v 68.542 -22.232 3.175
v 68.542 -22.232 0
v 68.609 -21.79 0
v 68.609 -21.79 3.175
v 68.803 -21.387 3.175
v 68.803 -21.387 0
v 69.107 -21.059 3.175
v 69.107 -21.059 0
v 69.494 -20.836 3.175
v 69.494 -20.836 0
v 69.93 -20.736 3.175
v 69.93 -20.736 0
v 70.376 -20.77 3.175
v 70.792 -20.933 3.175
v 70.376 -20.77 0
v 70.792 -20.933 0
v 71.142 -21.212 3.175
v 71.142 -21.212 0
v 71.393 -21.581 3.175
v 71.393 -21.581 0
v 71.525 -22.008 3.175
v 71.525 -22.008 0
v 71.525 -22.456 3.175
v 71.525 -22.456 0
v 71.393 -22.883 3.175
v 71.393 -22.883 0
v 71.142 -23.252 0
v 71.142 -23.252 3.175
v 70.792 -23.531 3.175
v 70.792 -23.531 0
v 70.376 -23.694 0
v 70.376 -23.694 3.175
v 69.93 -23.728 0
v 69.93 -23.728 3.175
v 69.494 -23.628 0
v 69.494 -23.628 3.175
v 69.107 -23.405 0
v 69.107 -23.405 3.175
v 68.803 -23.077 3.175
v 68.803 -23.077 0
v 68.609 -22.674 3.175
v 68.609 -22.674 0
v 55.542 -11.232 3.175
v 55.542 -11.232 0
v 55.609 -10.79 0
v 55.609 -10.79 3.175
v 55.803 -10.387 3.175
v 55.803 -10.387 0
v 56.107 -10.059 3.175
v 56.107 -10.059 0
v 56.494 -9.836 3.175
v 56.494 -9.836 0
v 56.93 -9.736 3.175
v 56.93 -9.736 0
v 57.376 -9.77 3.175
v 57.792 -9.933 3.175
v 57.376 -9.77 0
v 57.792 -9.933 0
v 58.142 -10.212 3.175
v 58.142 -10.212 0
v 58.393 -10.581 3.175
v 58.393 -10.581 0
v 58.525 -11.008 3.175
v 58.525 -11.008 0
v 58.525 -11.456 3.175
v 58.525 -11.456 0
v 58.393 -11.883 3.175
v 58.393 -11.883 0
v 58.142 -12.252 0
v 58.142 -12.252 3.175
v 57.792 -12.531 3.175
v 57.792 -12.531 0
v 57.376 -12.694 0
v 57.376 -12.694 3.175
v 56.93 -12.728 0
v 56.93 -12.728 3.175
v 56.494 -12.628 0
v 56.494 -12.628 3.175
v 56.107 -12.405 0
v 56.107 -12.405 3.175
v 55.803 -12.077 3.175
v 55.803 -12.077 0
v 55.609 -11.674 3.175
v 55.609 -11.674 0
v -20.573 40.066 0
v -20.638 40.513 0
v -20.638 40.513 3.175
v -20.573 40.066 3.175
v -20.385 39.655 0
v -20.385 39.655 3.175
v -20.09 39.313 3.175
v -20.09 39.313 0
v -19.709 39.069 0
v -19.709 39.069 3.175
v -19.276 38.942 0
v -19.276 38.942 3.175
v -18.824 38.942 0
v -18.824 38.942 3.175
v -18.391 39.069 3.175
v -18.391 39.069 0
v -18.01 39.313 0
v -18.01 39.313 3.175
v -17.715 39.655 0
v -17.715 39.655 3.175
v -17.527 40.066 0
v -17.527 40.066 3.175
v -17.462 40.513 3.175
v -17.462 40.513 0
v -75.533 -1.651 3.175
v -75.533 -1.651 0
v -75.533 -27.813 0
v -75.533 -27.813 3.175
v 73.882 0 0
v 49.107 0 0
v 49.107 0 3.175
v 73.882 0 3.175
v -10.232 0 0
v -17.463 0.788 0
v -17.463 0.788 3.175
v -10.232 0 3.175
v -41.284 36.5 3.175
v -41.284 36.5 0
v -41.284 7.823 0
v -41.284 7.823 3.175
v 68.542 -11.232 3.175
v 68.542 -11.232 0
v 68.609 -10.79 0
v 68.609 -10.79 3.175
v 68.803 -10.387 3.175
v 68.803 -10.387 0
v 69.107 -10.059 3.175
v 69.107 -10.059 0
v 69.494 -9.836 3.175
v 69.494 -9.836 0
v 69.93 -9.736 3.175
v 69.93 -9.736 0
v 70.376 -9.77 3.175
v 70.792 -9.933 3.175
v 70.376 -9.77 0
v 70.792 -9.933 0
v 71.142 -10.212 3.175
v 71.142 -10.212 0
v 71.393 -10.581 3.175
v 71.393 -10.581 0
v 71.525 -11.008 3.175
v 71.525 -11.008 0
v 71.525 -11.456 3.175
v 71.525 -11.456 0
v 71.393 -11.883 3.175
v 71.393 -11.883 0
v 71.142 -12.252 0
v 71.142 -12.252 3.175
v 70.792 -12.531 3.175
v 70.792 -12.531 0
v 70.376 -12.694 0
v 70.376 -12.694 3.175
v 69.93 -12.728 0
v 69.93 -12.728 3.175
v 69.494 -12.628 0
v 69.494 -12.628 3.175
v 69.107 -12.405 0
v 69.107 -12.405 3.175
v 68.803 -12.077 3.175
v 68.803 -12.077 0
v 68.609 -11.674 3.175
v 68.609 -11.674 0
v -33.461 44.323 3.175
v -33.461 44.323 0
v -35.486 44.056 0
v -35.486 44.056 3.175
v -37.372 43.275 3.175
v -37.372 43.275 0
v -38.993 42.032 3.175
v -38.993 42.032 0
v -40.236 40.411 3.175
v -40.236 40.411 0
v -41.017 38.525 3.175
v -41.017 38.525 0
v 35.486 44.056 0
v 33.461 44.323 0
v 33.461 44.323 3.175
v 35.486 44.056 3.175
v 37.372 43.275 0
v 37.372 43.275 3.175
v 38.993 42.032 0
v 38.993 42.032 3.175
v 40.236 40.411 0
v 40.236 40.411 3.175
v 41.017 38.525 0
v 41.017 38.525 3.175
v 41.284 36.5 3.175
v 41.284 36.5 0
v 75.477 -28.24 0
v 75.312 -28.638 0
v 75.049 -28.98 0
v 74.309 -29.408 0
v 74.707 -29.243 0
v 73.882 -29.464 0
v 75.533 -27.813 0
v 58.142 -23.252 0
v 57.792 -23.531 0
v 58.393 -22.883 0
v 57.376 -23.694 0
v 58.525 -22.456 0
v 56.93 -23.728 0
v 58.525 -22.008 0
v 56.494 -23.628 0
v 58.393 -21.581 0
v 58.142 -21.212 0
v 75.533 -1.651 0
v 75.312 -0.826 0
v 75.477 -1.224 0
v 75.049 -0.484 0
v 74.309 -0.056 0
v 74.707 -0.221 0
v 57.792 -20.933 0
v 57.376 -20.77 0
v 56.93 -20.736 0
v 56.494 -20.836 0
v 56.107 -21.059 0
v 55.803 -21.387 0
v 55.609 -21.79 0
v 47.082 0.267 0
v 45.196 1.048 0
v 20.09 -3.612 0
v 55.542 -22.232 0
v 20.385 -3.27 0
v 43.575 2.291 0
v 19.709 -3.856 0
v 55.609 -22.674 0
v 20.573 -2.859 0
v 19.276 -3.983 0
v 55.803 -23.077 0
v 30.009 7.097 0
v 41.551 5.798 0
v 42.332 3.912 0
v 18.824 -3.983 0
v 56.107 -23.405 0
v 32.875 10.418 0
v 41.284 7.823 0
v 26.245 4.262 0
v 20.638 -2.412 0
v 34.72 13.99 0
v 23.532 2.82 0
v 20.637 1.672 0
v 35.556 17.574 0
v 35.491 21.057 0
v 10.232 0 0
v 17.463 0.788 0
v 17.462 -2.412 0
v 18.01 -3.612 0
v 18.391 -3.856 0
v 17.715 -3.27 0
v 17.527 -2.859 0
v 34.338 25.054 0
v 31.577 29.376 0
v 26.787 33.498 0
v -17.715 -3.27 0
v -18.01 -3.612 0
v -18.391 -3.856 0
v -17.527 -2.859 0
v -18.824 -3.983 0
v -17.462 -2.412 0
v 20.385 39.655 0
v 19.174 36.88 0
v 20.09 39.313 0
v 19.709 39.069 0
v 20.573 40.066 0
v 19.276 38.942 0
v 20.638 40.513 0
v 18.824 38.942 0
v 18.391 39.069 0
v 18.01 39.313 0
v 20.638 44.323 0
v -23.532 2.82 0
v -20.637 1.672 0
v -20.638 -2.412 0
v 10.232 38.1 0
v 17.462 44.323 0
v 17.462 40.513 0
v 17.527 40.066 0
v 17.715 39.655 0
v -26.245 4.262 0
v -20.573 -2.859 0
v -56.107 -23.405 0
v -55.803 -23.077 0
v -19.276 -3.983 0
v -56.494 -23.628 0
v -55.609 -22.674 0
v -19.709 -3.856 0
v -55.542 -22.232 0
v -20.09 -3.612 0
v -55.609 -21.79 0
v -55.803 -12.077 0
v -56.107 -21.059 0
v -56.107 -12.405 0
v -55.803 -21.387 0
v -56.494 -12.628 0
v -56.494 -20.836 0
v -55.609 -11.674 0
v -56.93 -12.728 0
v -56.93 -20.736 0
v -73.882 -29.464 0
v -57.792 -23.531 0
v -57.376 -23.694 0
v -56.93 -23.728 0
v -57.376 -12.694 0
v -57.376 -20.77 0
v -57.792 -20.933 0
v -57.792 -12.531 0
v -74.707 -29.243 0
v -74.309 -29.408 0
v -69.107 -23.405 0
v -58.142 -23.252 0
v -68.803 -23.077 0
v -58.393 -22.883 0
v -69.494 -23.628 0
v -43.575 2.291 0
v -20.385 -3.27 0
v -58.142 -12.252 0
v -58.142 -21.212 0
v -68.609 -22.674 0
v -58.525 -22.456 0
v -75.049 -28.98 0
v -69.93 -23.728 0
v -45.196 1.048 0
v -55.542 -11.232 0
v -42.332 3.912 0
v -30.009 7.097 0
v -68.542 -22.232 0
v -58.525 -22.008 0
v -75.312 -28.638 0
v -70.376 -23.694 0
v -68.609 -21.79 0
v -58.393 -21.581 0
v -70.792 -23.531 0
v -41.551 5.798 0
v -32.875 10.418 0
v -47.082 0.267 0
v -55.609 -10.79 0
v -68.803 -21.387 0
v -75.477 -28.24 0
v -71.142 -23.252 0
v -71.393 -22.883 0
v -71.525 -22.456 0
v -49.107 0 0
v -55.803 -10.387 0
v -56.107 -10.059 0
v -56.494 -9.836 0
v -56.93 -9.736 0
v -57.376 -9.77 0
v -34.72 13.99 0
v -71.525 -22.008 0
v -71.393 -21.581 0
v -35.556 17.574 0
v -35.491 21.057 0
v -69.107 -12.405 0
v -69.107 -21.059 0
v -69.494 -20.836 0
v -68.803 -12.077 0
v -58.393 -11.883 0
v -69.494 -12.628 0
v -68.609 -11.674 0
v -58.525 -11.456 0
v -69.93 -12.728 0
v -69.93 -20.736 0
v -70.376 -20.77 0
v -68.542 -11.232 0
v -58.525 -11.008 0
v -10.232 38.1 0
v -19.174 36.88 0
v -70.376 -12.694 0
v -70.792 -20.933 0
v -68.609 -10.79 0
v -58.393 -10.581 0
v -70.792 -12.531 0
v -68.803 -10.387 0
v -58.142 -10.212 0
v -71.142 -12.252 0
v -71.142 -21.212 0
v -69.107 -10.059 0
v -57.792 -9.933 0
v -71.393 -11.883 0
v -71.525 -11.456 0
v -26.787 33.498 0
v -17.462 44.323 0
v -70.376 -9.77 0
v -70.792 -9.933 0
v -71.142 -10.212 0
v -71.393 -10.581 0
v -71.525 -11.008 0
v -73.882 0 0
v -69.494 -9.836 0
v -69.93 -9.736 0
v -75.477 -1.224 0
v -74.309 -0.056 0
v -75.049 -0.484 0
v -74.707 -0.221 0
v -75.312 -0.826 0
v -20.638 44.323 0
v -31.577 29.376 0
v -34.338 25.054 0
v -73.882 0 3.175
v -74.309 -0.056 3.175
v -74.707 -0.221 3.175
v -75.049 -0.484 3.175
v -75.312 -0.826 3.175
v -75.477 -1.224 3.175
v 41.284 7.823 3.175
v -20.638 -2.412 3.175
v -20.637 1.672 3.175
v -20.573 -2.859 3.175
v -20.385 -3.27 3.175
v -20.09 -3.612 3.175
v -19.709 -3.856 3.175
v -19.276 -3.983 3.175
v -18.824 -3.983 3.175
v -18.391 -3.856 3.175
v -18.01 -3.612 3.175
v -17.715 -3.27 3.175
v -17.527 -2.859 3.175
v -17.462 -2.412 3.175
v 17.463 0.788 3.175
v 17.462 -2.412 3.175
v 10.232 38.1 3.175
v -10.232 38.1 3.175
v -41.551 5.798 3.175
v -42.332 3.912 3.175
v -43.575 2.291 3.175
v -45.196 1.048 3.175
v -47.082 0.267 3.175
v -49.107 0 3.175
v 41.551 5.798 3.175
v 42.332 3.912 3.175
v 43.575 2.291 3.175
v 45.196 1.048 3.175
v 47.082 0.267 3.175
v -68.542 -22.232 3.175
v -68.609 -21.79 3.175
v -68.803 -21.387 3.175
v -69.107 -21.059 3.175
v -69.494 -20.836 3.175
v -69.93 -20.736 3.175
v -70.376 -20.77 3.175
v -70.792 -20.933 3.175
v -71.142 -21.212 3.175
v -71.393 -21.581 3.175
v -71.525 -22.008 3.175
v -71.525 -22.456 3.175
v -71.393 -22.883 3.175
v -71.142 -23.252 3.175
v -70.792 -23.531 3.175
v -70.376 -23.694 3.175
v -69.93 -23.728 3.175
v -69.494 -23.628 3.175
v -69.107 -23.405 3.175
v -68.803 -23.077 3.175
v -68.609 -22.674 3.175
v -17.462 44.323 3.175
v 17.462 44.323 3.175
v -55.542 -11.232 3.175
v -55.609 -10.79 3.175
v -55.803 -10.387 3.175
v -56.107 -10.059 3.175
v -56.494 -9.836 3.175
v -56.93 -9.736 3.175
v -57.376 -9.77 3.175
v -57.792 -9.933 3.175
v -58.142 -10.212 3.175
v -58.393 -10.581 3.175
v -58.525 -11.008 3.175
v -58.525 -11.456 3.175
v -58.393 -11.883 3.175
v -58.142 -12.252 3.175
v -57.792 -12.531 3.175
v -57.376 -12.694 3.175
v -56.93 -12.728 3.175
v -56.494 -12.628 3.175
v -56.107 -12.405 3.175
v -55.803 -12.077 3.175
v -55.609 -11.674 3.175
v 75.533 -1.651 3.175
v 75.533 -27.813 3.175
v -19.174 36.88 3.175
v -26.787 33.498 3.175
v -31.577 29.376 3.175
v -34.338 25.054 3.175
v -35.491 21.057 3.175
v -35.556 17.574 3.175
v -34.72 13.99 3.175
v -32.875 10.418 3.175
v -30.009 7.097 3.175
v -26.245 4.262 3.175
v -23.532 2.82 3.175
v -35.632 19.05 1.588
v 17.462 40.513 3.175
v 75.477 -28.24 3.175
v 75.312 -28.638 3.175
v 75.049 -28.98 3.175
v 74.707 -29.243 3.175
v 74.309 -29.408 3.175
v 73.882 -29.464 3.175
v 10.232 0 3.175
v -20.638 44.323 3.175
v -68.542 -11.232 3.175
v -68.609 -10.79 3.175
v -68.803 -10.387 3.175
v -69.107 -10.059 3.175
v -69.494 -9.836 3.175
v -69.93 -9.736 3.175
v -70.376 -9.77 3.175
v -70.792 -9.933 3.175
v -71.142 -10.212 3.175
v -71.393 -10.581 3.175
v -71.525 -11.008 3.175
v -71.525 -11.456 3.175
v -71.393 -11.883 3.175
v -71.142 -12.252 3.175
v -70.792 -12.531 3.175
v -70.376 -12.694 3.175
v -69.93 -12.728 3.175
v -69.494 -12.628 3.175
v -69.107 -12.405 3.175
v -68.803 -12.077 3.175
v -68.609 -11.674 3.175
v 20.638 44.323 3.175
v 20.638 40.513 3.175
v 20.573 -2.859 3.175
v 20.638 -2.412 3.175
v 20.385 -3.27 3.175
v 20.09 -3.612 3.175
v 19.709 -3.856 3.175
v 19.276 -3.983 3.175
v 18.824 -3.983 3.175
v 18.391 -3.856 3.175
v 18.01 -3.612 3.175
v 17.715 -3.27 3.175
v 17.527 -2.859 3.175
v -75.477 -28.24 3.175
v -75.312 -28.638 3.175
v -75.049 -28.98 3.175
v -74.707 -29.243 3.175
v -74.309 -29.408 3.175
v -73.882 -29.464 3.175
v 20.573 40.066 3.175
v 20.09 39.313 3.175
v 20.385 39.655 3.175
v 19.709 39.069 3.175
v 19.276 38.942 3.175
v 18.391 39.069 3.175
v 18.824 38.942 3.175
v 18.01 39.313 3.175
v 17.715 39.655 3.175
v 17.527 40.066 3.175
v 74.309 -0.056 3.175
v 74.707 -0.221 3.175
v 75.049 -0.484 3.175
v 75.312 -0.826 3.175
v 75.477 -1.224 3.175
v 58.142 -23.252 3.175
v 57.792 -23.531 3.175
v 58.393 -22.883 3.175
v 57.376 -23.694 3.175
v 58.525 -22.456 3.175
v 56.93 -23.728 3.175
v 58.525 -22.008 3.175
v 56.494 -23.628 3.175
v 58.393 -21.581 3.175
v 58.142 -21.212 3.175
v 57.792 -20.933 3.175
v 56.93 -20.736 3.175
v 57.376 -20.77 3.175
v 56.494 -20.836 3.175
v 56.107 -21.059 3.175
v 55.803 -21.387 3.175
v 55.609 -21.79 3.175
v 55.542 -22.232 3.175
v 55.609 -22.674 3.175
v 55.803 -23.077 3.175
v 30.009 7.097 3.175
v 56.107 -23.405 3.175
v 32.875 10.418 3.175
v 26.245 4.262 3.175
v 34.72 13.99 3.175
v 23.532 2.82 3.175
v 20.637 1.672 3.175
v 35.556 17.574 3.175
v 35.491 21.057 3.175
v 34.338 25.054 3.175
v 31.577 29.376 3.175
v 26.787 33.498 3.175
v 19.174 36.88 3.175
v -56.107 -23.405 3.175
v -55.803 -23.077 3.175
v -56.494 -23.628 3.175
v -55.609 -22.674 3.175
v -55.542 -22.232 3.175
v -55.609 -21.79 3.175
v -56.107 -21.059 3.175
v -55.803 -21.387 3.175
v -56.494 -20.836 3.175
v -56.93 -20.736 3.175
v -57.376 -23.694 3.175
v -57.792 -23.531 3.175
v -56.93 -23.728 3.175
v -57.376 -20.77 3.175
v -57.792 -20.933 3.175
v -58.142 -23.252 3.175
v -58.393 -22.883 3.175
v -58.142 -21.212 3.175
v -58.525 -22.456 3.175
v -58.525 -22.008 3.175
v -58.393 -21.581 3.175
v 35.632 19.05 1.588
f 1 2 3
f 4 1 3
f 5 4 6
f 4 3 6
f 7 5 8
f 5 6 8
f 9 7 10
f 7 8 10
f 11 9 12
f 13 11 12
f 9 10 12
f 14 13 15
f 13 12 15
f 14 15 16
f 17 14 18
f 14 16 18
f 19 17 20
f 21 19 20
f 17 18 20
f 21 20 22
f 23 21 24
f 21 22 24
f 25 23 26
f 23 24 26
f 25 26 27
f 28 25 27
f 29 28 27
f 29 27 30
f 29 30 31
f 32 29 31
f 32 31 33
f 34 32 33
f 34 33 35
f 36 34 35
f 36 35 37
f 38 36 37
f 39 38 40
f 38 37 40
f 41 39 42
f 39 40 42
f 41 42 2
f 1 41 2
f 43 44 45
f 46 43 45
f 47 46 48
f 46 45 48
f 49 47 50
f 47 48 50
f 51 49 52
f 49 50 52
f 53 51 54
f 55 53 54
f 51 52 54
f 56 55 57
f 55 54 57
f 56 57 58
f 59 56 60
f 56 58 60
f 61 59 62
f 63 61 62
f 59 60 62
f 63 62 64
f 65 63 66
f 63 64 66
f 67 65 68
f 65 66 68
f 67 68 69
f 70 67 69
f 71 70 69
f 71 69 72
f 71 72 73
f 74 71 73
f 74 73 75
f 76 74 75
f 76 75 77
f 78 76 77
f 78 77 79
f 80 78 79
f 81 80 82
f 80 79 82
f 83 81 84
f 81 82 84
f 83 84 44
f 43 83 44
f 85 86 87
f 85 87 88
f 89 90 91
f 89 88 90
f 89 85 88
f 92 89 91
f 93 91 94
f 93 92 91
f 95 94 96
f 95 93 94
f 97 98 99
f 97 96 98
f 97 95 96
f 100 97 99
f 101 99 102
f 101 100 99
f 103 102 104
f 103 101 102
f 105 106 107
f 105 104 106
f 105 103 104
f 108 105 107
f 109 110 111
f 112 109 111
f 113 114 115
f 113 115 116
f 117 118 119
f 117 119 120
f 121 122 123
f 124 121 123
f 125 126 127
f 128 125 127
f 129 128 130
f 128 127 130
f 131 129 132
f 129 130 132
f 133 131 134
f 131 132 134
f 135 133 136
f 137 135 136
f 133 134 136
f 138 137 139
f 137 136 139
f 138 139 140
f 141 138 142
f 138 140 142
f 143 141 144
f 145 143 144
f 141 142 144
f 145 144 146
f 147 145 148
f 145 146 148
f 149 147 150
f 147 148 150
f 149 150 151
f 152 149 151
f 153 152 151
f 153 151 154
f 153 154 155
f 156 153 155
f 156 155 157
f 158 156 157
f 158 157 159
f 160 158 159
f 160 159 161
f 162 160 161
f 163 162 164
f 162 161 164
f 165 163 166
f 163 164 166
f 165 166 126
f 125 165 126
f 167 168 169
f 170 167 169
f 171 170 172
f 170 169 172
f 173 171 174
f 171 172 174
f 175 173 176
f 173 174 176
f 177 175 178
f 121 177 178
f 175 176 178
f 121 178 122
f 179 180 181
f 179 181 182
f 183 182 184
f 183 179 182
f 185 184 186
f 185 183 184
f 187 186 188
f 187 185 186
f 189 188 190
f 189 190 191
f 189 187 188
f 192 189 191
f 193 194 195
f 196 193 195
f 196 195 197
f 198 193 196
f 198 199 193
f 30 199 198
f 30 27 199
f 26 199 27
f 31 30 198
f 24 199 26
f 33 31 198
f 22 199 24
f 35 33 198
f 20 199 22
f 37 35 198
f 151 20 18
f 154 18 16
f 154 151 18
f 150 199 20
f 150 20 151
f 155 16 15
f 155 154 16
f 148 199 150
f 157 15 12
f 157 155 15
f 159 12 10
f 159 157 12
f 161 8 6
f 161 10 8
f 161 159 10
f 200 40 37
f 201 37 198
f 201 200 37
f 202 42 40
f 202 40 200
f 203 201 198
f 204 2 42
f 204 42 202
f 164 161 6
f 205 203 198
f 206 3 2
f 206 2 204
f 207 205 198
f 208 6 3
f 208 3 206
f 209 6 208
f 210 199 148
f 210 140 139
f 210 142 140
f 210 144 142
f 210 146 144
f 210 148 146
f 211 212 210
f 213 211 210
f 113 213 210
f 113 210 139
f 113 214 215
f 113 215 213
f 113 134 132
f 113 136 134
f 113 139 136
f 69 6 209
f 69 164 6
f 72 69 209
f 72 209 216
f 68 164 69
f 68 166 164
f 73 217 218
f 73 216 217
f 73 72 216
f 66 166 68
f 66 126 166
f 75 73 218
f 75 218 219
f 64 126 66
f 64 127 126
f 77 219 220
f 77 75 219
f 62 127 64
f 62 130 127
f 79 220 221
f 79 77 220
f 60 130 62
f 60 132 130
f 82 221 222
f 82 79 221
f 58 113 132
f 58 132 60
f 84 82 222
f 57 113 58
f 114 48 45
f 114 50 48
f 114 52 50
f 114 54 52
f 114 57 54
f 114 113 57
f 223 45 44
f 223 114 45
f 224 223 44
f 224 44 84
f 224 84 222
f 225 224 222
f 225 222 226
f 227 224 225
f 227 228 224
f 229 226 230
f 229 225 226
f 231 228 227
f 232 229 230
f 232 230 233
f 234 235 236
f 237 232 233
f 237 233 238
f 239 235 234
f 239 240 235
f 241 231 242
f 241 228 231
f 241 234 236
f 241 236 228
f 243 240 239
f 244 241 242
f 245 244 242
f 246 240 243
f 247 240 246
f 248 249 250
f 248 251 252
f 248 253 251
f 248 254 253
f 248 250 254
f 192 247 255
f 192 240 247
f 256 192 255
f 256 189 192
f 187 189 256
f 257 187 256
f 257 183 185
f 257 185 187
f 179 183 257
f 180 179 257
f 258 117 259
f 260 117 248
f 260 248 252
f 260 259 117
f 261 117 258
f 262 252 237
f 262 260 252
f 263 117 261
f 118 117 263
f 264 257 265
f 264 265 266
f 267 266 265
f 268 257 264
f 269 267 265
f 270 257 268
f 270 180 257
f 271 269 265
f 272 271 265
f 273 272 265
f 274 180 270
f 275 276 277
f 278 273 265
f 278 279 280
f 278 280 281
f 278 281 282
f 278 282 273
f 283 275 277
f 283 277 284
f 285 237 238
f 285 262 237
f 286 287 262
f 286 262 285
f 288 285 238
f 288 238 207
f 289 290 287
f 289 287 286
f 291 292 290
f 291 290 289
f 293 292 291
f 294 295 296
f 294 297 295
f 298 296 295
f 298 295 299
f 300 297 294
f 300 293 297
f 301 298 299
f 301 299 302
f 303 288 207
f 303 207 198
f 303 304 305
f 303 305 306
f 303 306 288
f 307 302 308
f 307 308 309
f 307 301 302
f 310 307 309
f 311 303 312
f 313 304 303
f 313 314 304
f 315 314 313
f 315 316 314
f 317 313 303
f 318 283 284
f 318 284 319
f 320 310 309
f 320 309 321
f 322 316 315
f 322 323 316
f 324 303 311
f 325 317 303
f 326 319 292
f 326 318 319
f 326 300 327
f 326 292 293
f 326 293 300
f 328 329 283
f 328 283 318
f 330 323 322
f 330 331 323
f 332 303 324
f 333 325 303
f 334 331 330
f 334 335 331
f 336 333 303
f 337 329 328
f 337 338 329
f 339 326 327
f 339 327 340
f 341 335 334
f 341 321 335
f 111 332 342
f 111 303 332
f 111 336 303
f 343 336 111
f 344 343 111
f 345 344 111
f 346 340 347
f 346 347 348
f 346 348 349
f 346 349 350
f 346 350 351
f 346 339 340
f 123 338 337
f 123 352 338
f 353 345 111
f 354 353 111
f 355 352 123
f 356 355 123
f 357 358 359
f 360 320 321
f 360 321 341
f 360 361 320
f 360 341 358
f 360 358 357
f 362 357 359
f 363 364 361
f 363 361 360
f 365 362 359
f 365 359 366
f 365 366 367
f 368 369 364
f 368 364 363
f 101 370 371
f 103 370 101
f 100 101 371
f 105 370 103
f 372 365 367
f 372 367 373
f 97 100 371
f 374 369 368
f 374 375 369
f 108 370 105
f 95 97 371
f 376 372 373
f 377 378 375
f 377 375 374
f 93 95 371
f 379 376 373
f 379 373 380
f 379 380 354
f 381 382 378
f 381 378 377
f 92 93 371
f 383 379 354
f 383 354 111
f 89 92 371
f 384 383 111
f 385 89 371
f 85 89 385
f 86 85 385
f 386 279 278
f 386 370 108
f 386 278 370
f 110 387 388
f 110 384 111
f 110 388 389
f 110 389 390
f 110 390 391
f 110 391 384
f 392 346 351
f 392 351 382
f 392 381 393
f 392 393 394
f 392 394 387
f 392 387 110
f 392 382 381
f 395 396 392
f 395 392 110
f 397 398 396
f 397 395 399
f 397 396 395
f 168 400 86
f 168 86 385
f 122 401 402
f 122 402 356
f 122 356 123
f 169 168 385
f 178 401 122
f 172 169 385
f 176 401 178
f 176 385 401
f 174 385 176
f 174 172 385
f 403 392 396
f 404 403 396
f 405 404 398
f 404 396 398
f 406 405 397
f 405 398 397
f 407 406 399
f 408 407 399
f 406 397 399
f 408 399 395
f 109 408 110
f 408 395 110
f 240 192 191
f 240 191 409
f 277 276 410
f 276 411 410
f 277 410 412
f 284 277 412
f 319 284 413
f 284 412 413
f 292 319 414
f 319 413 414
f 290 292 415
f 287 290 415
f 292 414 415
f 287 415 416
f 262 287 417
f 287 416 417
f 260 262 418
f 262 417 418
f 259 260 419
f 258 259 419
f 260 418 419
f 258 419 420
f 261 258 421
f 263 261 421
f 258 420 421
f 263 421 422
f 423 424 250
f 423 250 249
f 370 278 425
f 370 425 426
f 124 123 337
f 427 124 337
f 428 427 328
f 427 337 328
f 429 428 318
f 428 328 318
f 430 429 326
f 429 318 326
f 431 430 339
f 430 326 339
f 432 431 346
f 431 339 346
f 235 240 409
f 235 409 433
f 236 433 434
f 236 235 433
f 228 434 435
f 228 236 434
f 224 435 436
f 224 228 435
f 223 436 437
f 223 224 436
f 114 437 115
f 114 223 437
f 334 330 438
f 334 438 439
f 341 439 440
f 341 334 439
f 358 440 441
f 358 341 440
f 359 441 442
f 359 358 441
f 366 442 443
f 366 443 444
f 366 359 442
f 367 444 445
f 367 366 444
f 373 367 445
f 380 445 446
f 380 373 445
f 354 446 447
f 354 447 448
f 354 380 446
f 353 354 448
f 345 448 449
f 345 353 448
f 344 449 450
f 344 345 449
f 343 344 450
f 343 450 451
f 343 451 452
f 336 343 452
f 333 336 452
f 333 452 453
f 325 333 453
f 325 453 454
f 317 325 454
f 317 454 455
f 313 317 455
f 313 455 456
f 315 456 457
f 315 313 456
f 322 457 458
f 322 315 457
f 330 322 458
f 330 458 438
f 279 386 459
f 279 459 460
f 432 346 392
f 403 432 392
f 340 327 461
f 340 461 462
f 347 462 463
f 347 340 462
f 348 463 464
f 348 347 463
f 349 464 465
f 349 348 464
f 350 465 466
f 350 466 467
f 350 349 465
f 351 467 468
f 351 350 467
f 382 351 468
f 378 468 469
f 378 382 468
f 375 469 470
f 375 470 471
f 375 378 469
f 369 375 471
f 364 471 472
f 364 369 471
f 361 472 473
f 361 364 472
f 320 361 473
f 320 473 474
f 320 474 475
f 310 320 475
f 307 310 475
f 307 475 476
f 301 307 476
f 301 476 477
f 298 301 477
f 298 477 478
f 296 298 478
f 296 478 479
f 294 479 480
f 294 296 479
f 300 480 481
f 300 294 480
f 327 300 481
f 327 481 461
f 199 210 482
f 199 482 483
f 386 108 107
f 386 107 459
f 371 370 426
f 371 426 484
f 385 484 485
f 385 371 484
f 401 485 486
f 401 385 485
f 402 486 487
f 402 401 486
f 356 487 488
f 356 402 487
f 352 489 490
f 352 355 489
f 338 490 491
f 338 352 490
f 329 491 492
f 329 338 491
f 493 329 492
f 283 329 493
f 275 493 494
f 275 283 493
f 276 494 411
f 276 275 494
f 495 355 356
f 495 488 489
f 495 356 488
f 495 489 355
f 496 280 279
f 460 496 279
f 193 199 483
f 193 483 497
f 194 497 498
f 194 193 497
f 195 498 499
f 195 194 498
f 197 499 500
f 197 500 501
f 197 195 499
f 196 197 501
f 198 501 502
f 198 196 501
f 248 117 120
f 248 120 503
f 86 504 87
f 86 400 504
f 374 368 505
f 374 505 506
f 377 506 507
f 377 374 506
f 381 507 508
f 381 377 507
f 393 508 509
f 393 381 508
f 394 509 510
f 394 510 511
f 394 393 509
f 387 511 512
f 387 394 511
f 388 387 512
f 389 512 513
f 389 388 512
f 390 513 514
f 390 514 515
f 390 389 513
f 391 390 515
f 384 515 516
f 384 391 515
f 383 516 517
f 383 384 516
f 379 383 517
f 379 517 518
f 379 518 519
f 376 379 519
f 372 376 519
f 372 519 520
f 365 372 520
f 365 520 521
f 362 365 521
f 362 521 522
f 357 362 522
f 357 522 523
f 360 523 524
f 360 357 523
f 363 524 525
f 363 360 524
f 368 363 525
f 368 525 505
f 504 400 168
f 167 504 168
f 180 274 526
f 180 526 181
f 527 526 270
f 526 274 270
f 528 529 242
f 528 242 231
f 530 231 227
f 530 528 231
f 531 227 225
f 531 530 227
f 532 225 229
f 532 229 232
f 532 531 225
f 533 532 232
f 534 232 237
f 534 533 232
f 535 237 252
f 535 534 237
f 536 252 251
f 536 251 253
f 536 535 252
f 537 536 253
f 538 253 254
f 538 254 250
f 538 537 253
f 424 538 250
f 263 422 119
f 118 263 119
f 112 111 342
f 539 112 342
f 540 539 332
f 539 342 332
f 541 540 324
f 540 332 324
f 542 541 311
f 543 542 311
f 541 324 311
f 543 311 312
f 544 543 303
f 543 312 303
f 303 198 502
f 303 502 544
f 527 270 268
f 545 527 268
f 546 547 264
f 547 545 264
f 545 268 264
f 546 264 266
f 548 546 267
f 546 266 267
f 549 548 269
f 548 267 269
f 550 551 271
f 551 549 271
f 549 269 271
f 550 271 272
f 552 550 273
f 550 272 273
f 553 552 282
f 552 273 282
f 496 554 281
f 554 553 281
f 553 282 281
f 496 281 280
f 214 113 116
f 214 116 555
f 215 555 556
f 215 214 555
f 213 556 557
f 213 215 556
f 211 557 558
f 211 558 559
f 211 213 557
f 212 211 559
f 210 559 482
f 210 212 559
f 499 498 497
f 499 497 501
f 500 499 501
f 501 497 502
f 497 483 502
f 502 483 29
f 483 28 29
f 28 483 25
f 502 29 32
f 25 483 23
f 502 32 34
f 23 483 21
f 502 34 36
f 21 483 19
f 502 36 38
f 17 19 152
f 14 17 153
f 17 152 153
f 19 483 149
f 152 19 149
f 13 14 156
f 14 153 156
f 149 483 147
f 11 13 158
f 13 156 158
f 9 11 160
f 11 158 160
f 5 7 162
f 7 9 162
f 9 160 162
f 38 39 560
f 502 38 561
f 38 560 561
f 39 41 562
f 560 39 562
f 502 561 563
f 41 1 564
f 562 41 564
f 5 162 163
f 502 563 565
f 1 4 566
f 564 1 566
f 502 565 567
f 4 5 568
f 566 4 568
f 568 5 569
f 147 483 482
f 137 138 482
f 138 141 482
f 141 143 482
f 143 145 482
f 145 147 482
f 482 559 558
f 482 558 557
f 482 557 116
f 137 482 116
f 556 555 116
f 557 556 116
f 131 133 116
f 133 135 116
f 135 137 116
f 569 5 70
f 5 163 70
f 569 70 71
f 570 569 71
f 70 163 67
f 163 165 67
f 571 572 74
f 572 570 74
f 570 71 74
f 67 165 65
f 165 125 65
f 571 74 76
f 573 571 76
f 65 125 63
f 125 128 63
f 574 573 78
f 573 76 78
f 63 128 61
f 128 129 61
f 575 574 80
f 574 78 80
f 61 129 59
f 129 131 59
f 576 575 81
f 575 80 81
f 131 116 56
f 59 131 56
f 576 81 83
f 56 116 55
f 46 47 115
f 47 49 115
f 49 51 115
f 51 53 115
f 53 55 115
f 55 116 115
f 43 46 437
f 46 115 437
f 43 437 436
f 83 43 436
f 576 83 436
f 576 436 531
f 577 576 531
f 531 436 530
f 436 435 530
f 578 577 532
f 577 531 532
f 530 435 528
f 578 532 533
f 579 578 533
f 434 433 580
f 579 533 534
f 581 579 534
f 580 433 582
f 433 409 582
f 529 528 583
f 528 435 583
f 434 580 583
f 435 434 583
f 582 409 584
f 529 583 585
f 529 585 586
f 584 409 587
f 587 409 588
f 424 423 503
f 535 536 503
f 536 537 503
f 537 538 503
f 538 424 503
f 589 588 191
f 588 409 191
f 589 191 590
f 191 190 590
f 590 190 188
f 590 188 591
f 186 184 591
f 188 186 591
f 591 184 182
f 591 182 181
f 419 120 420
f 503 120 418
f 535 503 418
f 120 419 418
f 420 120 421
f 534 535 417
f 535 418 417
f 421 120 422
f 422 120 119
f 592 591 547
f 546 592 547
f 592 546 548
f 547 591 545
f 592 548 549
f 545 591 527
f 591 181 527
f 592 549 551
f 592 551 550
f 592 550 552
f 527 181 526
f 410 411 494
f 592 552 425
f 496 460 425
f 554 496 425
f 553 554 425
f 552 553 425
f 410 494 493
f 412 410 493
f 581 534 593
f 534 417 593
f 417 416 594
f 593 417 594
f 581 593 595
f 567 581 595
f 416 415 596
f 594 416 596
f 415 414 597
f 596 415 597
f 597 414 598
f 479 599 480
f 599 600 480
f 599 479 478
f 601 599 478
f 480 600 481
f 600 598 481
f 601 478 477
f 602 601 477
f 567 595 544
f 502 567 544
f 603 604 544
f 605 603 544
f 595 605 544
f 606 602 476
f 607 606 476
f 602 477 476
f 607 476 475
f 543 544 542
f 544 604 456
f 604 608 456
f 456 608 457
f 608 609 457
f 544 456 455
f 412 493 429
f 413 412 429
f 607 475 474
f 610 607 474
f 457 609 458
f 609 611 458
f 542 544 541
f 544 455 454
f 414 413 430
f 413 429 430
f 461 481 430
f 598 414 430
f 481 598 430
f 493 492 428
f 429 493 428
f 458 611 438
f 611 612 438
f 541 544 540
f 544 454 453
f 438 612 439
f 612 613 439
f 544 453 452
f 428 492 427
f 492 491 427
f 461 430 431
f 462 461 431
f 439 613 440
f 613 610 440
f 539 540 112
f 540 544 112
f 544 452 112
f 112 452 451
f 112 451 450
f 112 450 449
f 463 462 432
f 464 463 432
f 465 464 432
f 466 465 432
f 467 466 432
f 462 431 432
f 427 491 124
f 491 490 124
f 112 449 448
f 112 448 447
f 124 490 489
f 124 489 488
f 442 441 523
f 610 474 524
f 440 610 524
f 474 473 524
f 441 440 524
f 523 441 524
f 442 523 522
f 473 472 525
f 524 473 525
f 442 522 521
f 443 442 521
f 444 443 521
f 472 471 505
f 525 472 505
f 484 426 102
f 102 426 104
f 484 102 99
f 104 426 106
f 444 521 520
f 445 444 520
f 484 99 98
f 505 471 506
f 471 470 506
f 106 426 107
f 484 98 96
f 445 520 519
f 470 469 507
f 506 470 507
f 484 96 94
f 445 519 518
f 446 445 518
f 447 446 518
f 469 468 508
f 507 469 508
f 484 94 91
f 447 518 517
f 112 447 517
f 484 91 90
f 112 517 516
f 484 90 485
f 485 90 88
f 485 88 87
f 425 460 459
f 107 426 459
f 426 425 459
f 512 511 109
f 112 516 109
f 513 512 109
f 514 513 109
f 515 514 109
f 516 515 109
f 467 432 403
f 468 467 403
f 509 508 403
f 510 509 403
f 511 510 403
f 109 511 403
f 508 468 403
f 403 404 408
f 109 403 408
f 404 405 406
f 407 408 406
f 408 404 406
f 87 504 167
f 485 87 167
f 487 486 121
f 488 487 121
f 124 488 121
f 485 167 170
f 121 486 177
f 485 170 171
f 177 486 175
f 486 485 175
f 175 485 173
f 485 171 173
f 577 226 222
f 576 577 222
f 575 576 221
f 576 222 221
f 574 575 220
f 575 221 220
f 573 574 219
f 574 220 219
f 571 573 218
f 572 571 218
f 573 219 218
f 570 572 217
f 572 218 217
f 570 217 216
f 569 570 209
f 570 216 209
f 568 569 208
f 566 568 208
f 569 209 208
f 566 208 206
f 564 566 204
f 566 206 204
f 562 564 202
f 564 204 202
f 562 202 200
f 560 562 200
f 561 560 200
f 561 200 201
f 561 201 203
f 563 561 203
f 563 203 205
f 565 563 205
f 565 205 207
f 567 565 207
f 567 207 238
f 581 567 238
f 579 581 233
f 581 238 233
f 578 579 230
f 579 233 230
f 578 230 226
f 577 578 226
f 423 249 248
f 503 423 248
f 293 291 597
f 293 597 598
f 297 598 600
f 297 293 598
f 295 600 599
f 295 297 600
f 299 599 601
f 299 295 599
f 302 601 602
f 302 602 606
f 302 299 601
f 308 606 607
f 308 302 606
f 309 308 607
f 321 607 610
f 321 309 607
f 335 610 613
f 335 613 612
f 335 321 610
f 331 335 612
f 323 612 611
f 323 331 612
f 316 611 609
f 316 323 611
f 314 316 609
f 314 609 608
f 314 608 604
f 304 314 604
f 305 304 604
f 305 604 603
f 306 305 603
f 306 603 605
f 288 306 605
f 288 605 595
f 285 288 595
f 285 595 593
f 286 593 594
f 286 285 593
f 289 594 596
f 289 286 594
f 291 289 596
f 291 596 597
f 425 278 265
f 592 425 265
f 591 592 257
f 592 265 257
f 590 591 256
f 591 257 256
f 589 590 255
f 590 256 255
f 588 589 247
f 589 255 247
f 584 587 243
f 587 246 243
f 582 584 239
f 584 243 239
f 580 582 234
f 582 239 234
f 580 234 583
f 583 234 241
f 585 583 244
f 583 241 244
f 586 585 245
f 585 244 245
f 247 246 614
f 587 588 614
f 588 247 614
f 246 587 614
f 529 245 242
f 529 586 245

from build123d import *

# Parameters (mm, degrees)
F0_R     = 1.5
F1_DEPTH = 3.175
F3_DEPTH = 12.5


with BuildPart() as f1:
    # F0 (on Top) → F1 (new body)
    with BuildSketch(Plane.XY):
        with BuildLine():
            Line((0, 38.1), (0, 44.323))
            Line((0, 44.323), (-33.461, 44.323))
            ThreePointArc((-33.461, 44.323), (-38.9926963492, 42.0316963492), (-41.284, 36.5))
            Line((-41.284, 36.5), (-41.284, 7.823))
            ThreePointArc((-41.284, 7.823), (-43.5753036508, 2.2913036508), (-49.107, 0))
            Line((-49.107, 0), (-73.882, 0))
            ThreePointArc((-73.882, 0), (-75.0494332957, -0.4835667043), (-75.533, -1.651))
            Line((-75.533, -1.651), (-75.533, -27.813))
            ThreePointArc((-75.533, -27.813), (-75.0494332957, -28.9804332957), (-73.882, -29.464))
            Line((-73.882, -29.464), (0, -29.464))
            Line((0, -29.464), (0, 0))
            Line((0, 0), (-10.232, 0))
            add(Edge.make_bspline(
                [(-10.232, 38.1), (-35.632, 38.1), (-35.632, 19.05), (-35.632, 0), (-10.232, 0)],
                knots=[1.5707963268, 1.5707963268, 1.5707963268, 3.1415926536, 3.1415926536, 4.7123889804, 4.7123889804, 4.7123889804], degree=2, weights=[1, 0.7071067812, 1, 0.7071067812, 1]))
            Line((-10.232, 38.1), (0, 38.1))
        make_face()
        with Locations((-70.042, -22.232)):
            Circle(F0_R, mode=Mode.SUBTRACT)
        with Locations((-57.042, -22.232)):
            Circle(F0_R, mode=Mode.SUBTRACT)
        with Locations((-70.042, -11.232)):
            Circle(F0_R, mode=Mode.SUBTRACT)
        with Locations((-57.042, -11.232)):
            Circle(F0_R, mode=Mode.SUBTRACT)
    extrude(amount=F1_DEPTH)

    # F2 (on Top) → F3 (cut, symmetric)
    with BuildSketch(Plane.XY):
        with BuildLine():
            Line((-20.6375, 50.55129749), (-20.6375, 40.513))
            ThreePointArc((-20.6375, 40.513), (-19.05, 38.9255), (-17.4625, 40.513))
            Line((-17.4625, 40.513), (-17.4625, 50.55129749))
            Line((-17.4625, 50.55129749), (-20.6375, 50.55129749))
        make_face()
        with BuildLine():
            Line((-17.4625, 7.62629749), (-20.6375, 7.62629749))
            Line((-20.6375, 7.62629749), (-20.6375, -2.412))
            ThreePointArc((-20.6375, -2.412), (-19.05, -3.9995), (-17.4625, -2.412))
            Line((-17.4625, -2.412), (-17.4625, 7.62629749))
        make_face()
    extrude(amount=F3_DEPTH, both=True, mode=Mode.SUBTRACT)

    # F4: F1 across plane


with BuildPart() as f1_1:
    add(f1.part)
    add(f1.part.mirror(Plane.YZ))


solid = f1_1.part
